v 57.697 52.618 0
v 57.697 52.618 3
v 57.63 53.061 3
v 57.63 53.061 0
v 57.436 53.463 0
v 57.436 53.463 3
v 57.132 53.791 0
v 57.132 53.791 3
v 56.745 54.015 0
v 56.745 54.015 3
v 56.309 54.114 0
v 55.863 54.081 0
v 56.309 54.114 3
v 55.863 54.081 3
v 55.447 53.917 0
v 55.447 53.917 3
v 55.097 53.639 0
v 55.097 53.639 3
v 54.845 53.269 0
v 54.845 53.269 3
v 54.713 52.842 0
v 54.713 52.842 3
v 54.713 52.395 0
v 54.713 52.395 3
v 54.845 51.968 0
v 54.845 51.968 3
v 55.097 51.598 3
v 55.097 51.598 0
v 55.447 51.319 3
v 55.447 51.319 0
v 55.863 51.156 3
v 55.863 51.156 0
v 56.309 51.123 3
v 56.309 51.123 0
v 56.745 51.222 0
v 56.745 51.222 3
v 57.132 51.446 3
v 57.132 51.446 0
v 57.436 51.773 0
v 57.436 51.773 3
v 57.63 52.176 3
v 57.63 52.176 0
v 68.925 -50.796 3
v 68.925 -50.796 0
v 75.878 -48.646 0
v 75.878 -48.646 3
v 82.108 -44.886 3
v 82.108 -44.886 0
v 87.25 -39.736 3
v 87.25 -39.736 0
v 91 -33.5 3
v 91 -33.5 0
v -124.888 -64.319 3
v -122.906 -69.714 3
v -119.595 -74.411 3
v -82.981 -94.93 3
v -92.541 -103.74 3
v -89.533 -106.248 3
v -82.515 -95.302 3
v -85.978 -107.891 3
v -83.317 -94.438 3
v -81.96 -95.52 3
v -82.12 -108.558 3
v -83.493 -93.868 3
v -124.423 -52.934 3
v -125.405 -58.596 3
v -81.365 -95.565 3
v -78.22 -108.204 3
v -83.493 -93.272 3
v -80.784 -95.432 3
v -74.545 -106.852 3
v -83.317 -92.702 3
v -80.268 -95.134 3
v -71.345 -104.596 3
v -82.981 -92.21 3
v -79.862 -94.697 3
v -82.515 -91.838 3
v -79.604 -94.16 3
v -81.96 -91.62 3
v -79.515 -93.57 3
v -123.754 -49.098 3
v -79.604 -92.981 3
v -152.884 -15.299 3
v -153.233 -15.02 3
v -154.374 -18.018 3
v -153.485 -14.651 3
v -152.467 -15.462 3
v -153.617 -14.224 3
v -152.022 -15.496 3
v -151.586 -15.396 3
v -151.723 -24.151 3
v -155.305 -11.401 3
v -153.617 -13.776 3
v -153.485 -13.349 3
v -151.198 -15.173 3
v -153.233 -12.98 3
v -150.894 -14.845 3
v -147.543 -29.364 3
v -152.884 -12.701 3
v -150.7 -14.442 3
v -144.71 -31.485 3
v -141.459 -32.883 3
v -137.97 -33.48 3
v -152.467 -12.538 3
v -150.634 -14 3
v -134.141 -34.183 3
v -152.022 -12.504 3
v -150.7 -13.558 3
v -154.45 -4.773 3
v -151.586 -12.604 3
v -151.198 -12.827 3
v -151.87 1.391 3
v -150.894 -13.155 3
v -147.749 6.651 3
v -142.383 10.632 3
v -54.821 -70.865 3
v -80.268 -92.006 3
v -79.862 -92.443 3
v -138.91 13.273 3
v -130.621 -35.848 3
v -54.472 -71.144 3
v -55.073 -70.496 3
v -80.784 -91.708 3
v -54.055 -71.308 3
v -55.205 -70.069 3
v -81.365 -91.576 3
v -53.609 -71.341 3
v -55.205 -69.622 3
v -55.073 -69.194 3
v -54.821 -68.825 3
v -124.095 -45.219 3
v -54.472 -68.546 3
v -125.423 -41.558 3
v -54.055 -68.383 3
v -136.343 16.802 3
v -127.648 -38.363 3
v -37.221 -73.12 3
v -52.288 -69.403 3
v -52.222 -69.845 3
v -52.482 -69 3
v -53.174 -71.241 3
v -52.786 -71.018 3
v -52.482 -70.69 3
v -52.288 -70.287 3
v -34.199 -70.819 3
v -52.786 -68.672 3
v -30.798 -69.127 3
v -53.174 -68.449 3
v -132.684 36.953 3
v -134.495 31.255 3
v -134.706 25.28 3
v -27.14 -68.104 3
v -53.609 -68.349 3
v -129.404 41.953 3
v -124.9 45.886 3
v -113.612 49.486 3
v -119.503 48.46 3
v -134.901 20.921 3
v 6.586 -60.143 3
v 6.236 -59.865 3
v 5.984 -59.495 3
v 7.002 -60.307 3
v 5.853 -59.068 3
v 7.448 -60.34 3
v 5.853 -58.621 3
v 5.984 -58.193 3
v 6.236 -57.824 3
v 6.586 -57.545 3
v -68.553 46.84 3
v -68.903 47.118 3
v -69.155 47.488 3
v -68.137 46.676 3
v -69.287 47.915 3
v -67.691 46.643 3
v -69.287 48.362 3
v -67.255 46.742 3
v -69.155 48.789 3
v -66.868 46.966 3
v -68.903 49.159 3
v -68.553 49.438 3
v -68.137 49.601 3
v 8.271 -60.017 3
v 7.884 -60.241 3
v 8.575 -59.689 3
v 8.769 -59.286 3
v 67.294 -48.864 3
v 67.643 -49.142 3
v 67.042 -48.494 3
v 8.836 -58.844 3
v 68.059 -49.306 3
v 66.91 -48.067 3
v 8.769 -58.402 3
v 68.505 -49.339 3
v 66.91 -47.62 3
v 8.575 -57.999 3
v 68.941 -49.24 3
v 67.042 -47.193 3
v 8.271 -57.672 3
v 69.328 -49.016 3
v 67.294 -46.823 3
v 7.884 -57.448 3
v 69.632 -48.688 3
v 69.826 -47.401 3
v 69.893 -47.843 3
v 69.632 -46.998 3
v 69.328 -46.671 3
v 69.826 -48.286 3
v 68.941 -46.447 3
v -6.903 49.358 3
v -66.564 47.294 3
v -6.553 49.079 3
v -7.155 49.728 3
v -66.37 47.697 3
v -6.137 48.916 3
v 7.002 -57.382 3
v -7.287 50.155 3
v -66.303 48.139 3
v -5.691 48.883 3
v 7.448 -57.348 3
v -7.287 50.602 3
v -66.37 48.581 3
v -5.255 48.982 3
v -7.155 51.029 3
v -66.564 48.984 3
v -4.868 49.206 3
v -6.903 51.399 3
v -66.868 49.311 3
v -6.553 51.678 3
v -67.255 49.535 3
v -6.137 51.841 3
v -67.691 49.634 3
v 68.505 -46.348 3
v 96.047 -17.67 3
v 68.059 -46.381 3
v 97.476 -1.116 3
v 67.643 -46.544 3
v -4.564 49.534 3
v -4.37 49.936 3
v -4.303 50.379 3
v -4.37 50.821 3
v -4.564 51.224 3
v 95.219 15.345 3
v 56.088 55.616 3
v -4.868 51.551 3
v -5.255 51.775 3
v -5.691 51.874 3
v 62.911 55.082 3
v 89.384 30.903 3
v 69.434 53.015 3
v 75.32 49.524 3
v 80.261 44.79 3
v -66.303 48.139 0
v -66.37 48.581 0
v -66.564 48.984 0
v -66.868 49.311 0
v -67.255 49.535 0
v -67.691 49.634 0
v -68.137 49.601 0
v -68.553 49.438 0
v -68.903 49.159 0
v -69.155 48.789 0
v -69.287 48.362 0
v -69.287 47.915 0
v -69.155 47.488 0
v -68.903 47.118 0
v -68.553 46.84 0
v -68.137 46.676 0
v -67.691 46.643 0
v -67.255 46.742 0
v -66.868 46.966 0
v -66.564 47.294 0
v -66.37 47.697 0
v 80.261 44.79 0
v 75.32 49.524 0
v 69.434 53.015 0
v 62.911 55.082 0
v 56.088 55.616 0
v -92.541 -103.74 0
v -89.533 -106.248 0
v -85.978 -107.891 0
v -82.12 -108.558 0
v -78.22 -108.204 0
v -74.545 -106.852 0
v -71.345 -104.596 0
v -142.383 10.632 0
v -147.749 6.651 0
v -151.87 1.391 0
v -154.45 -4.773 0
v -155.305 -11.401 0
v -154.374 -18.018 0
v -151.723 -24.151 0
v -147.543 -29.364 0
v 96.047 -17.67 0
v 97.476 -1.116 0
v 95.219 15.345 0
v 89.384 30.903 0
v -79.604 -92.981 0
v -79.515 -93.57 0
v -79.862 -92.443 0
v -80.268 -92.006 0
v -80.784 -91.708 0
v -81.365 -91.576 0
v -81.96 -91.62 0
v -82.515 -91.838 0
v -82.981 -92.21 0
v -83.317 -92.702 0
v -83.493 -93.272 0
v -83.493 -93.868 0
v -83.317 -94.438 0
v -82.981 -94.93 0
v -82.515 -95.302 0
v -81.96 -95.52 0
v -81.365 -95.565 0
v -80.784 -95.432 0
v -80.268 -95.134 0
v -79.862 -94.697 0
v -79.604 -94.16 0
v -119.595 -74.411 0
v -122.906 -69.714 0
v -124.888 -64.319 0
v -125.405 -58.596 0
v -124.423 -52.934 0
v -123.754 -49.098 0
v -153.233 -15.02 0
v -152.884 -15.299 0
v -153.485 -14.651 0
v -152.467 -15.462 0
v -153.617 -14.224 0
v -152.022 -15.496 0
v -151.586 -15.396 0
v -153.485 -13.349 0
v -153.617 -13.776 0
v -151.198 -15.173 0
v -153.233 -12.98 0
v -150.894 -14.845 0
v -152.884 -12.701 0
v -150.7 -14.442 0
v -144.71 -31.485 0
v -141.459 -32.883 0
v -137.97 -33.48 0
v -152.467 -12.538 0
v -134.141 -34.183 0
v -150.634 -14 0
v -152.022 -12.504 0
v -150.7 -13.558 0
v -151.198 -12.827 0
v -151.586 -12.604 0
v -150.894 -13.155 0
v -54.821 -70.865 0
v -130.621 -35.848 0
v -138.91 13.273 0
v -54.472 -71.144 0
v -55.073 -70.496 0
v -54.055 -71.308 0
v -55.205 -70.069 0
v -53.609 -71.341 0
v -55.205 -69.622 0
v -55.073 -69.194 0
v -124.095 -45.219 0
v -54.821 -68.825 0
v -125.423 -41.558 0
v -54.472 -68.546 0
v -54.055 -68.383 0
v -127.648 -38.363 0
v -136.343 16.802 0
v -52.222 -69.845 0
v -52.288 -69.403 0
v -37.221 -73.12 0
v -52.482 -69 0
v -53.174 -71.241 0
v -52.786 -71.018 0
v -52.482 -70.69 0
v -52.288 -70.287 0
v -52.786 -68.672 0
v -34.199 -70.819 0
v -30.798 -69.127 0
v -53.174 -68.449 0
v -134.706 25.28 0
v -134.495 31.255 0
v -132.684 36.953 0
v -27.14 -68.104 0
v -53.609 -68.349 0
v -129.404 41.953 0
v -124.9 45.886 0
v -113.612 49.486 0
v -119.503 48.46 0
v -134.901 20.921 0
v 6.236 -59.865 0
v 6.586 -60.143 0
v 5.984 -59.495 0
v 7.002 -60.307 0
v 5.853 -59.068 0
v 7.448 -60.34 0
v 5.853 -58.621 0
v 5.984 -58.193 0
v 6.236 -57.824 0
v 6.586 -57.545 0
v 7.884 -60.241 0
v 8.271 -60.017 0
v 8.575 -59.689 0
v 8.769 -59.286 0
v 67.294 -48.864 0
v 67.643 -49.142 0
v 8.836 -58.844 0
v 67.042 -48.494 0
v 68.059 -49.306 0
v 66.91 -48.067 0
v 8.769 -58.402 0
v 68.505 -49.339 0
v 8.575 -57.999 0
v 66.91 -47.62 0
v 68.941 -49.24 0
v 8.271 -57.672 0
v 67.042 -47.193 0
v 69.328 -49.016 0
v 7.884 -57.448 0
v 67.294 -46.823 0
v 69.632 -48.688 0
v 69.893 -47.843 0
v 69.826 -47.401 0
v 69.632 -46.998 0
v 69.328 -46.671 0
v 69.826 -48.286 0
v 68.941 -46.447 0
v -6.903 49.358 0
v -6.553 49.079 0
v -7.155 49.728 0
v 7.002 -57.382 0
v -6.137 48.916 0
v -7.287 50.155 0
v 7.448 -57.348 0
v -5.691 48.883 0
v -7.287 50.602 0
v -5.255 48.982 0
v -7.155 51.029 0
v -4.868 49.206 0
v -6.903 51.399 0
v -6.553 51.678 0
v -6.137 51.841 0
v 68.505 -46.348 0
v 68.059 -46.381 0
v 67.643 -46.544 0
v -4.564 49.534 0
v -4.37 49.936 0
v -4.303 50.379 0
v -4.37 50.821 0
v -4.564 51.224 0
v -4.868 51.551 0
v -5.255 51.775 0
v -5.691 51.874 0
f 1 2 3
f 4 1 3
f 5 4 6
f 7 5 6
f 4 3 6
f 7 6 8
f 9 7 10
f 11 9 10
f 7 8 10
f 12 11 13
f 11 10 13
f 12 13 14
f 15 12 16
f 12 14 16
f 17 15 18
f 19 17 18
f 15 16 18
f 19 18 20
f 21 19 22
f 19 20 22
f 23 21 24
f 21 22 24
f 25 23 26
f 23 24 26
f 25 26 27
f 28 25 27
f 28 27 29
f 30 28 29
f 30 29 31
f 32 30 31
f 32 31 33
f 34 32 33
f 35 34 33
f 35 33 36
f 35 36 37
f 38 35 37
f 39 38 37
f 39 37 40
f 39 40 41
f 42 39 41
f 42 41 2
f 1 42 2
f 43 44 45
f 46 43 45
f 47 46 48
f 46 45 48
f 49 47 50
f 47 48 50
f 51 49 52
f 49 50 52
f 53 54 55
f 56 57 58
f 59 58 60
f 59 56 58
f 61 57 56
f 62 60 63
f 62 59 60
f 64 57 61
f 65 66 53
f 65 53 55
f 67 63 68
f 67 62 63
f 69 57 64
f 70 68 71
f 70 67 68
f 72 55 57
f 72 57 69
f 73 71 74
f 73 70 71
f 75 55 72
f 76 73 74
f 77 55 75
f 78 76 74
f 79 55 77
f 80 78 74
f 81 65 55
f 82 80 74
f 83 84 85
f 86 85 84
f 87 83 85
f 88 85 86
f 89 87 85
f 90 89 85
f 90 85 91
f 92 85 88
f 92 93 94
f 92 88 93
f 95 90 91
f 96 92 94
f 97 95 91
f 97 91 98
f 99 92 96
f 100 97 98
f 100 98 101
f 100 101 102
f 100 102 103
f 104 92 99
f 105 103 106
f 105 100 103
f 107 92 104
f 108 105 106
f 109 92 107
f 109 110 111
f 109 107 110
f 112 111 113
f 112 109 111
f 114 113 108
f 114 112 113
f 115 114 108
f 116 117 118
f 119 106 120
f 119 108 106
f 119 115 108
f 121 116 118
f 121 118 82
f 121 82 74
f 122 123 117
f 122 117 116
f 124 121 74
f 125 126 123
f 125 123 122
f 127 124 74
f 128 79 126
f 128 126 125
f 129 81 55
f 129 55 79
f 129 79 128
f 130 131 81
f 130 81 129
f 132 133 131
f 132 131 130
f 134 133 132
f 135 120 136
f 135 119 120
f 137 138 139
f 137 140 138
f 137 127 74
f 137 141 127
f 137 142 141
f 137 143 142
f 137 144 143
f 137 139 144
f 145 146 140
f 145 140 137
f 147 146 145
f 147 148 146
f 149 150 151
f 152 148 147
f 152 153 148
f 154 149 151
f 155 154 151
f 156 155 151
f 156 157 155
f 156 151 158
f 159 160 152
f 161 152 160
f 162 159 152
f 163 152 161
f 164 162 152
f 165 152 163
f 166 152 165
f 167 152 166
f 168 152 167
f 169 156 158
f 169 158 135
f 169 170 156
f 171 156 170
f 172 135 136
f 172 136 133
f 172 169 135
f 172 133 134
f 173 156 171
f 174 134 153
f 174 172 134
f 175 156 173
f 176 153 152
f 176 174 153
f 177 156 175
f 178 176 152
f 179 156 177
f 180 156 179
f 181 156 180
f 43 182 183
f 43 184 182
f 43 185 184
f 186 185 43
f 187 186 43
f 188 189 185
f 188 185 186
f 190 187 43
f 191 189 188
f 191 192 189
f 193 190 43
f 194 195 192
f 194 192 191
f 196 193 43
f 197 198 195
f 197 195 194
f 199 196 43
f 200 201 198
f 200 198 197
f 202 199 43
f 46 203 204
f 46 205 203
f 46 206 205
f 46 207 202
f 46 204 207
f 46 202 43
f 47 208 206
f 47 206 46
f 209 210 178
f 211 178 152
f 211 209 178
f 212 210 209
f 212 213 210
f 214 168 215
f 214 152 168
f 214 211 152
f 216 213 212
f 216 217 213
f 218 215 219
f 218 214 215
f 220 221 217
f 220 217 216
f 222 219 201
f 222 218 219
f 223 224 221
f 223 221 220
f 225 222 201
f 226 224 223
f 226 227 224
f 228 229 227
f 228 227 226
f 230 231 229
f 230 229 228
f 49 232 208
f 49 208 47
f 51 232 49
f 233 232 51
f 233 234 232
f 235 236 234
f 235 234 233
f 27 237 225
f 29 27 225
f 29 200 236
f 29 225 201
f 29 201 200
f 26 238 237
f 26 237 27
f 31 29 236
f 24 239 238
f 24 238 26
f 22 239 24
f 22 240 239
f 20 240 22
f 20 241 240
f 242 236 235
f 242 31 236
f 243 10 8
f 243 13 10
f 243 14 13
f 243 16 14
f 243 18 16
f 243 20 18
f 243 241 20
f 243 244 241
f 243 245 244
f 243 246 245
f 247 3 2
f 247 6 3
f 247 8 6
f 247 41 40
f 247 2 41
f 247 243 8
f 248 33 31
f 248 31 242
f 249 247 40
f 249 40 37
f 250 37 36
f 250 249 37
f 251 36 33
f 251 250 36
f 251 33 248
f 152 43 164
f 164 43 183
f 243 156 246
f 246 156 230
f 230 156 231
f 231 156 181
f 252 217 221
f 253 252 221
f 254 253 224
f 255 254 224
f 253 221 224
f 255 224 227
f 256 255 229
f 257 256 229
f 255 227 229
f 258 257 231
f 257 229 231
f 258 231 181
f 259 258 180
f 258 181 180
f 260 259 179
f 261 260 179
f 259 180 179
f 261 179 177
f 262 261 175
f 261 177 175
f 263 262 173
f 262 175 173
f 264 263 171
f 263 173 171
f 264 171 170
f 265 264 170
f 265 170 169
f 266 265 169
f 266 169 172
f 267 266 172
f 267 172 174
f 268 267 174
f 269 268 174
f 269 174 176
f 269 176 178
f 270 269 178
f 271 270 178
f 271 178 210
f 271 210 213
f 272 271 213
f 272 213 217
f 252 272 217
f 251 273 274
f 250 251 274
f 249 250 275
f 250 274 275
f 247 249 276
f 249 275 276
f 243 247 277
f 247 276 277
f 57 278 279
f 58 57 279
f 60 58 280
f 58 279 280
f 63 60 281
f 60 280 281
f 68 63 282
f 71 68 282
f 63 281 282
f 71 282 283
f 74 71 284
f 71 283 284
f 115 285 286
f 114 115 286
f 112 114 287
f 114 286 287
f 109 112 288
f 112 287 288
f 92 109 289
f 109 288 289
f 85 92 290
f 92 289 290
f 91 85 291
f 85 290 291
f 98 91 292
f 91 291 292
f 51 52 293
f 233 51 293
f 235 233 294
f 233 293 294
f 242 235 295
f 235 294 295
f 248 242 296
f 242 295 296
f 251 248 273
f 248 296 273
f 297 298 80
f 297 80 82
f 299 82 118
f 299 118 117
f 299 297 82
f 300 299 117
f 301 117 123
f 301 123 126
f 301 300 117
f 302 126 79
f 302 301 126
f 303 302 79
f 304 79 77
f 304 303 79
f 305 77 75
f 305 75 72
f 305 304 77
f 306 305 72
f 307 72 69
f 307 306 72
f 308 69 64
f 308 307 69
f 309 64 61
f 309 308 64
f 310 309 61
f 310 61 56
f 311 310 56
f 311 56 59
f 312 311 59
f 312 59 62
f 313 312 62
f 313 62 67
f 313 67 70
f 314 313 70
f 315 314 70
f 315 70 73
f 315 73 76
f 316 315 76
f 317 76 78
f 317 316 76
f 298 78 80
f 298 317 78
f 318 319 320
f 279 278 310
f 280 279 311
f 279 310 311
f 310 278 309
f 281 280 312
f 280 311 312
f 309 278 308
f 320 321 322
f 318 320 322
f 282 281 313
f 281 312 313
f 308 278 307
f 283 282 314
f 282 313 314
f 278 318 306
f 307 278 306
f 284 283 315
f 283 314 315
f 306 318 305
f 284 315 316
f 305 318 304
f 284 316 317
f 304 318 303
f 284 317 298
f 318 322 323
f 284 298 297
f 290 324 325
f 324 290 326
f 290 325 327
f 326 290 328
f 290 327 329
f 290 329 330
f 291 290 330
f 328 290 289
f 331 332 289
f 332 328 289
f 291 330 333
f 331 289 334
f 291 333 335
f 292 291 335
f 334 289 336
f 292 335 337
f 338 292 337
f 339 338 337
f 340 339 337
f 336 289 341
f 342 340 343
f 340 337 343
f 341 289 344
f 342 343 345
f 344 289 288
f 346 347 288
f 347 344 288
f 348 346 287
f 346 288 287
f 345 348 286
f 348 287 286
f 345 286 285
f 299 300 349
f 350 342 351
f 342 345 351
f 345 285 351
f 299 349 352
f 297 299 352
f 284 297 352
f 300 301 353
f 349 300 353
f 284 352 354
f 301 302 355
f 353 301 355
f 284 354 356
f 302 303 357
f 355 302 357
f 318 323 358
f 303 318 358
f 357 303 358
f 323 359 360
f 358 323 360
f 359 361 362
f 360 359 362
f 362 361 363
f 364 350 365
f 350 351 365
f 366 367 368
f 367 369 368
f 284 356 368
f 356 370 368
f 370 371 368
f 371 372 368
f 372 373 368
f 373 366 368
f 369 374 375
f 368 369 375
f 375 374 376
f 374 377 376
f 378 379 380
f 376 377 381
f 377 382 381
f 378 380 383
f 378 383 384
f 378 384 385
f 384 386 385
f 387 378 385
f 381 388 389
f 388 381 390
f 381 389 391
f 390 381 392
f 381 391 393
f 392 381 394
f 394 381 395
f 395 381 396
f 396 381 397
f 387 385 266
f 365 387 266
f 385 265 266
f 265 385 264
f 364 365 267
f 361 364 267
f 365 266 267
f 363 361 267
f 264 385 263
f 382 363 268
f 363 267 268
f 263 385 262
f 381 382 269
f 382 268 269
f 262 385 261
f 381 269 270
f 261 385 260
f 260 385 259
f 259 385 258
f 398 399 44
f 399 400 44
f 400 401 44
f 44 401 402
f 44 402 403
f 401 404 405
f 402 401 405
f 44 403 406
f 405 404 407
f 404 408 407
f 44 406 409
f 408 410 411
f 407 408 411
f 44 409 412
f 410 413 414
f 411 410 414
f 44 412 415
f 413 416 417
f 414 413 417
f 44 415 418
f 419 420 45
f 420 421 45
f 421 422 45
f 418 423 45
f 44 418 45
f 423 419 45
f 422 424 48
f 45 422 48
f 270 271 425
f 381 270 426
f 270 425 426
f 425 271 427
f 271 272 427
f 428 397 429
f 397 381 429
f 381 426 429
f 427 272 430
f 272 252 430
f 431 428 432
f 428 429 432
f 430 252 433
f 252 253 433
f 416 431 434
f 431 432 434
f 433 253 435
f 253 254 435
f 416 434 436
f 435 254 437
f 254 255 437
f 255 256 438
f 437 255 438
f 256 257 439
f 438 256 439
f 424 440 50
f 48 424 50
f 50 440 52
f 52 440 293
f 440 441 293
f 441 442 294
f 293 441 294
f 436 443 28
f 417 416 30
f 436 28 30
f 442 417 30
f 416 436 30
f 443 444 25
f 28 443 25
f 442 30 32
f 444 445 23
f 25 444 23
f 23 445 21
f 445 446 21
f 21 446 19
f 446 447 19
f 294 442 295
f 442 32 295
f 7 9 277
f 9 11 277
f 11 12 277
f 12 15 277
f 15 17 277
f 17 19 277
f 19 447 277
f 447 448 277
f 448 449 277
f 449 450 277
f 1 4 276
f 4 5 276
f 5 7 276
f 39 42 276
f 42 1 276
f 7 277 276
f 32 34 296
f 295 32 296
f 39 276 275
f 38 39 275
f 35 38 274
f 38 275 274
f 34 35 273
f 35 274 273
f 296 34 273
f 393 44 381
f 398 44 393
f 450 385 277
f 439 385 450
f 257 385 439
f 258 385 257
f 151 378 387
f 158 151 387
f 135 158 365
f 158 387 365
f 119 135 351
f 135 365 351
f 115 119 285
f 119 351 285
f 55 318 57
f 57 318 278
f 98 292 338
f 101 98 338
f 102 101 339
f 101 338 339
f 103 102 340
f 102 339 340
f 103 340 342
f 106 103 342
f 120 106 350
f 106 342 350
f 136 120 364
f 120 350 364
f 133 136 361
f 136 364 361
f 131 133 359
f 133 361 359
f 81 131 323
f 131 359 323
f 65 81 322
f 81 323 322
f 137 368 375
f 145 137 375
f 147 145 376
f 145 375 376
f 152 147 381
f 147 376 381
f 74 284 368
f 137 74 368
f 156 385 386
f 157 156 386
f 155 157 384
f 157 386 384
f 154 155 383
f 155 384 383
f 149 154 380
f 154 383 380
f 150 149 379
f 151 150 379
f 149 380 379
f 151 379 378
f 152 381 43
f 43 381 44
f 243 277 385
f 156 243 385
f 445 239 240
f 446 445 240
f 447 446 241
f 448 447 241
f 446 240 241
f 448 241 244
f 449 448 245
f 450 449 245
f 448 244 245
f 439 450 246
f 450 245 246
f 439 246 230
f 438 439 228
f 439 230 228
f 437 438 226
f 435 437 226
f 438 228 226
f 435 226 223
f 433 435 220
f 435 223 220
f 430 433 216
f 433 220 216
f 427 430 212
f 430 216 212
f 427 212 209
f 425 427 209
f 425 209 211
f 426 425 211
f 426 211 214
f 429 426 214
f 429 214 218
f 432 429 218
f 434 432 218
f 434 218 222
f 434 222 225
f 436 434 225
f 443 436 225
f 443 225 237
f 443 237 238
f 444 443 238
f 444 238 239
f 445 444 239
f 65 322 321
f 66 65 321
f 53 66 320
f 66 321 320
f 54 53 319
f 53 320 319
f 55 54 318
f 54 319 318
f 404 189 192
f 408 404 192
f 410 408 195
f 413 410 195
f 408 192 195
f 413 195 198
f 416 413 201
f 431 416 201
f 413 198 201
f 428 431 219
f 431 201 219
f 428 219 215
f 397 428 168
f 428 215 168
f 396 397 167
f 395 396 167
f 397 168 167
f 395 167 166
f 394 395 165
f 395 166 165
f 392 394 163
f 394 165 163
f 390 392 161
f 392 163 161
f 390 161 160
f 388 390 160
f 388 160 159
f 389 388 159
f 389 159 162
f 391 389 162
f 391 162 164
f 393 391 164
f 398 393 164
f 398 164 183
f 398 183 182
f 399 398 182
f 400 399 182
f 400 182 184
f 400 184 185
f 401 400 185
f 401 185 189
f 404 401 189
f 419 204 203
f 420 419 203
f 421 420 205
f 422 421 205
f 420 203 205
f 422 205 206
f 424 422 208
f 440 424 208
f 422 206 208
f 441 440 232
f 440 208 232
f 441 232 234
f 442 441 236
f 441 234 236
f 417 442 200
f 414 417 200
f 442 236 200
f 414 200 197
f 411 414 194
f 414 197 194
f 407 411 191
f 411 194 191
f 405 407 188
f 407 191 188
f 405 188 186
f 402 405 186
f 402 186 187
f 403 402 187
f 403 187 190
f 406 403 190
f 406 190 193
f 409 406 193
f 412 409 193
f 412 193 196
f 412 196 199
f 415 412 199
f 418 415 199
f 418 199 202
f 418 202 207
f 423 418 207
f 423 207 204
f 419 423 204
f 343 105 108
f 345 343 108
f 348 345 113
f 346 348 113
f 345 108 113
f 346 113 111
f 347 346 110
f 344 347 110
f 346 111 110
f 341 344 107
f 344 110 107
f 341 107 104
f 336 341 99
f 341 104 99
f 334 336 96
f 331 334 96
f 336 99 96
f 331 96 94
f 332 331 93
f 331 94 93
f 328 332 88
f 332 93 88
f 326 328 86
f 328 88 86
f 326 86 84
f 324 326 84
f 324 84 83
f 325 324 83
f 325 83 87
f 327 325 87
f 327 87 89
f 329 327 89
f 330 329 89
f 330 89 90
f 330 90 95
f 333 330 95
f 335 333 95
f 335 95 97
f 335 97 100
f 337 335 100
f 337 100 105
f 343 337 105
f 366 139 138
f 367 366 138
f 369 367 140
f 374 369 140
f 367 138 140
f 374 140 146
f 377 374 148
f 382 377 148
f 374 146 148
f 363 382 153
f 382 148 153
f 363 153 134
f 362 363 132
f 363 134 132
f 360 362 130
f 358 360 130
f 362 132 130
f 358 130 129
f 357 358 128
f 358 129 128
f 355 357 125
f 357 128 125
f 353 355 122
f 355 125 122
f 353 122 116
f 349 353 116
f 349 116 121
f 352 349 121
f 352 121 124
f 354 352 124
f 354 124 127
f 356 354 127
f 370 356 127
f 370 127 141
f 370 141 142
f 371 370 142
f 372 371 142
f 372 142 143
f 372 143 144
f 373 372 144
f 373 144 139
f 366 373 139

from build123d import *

# Parameters (mm, degrees)
SKETCH1_R           = 2
BOSS_EXTRUDE1_DEPTH = 3
SKETCH2_R           = 1.5
CUT_EXTRUDE1_DEPTH  = 190.515777006


with BuildPart() as part:
    # Sketch1 → Boss-Extrude1 (new body)
    with BuildSketch(Plane.XY):
        with BuildLine():
            ThreePointArc((-137.970351553, -33.480224156), (-126.431132561, -39.888203569), (-124.422839539, -52.93360637))
            ThreePointArc((-124.422839539, -52.93360637), (-124.888175134, -64.31939994), (-119.594822483, -74.410646153))
            Line((-119.594822483, -74.410646153), (-92.540517723, -103.740413224))
            ThreePointArc((-92.540517723, -103.740413224), (-82.119700521, -108.557935129), (-71.344567605, -104.595807028))
            Line((-71.344567605, -104.595807028), (-37.221129556, -73.119733925))
            ThreePointArc((-37.221129556, -73.119733925), (-32.538343047, -69.892896145), (-27.140055215, -68.104192696))
            Line((-27.140055215, -68.104192696), (68.925058584, -50.795851294))
            ThreePointArc((68.925058584, -50.795851294), (82.107908339, -44.886103489), (91, -33.5))
            ThreePointArc((91, -33.5), (96.805715124, 7.17766304), (80.26119478, 44.789595257))
            ThreePointArc((80.26119478, 44.789595257), (69.434281248, 53.01522195), (56.08825014, 55.616461034))
            Line((56.08825014, 55.616461034), (-113.612396892, 49.485657177))
            ThreePointArc((-113.612396892, 49.485657177), (-129.404309407, 41.953313258), (-134.705774542, 25.279526249))
            ThreePointArc((-134.705774542, 25.279526249), (-136.343375771, 16.802270376), (-142.382746132, 10.632050724))
            ThreePointArc((-142.382746132, 10.632050724), (-155.099864059, -8.058287742), (-147.542861296, -29.364285714))
            ThreePointArc((-147.542861296, -29.364285714), (-143.125485566, -32.280163581), (-137.970351553, -33.480224156))
        make_face()
        with Locations((-81.514845762, -93.570135067)):
            Circle(SKETCH1_R, mode=Mode.SUBTRACT)
    extrude(amount=BOSS_EXTRUDE1_DEPTH)

    # Sketch2 → Cut-Extrude1 (cut, through all)
    with BuildSketch(Plane.XY.offset(3)):
        with Locations((56.196560986, 52.618416878)):
            Circle(SKETCH2_R)
        with Locations((-5.803439014, 50.378532436)):
            Circle(SKETCH2_R)
        with Locations((-67.803439014, 48.138647993)):
            Circle(SKETCH2_R)
        with Locations((68.393104802, -47.843390427)):
            Circle(SKETCH2_R)
        with Locations((7.335774003, -58.84427394)):
            Circle(SKETCH2_R)
        with Locations((-152.133709173, -14)):
            Circle(SKETCH2_R)
        with Locations((-53.721556796, -69.845157453)):
            Circle(SKETCH2_R)
    extrude(amount=-CUT_EXTRUDE1_DEPTH, mode=Mode.SUBTRACT)


solid = part.part
